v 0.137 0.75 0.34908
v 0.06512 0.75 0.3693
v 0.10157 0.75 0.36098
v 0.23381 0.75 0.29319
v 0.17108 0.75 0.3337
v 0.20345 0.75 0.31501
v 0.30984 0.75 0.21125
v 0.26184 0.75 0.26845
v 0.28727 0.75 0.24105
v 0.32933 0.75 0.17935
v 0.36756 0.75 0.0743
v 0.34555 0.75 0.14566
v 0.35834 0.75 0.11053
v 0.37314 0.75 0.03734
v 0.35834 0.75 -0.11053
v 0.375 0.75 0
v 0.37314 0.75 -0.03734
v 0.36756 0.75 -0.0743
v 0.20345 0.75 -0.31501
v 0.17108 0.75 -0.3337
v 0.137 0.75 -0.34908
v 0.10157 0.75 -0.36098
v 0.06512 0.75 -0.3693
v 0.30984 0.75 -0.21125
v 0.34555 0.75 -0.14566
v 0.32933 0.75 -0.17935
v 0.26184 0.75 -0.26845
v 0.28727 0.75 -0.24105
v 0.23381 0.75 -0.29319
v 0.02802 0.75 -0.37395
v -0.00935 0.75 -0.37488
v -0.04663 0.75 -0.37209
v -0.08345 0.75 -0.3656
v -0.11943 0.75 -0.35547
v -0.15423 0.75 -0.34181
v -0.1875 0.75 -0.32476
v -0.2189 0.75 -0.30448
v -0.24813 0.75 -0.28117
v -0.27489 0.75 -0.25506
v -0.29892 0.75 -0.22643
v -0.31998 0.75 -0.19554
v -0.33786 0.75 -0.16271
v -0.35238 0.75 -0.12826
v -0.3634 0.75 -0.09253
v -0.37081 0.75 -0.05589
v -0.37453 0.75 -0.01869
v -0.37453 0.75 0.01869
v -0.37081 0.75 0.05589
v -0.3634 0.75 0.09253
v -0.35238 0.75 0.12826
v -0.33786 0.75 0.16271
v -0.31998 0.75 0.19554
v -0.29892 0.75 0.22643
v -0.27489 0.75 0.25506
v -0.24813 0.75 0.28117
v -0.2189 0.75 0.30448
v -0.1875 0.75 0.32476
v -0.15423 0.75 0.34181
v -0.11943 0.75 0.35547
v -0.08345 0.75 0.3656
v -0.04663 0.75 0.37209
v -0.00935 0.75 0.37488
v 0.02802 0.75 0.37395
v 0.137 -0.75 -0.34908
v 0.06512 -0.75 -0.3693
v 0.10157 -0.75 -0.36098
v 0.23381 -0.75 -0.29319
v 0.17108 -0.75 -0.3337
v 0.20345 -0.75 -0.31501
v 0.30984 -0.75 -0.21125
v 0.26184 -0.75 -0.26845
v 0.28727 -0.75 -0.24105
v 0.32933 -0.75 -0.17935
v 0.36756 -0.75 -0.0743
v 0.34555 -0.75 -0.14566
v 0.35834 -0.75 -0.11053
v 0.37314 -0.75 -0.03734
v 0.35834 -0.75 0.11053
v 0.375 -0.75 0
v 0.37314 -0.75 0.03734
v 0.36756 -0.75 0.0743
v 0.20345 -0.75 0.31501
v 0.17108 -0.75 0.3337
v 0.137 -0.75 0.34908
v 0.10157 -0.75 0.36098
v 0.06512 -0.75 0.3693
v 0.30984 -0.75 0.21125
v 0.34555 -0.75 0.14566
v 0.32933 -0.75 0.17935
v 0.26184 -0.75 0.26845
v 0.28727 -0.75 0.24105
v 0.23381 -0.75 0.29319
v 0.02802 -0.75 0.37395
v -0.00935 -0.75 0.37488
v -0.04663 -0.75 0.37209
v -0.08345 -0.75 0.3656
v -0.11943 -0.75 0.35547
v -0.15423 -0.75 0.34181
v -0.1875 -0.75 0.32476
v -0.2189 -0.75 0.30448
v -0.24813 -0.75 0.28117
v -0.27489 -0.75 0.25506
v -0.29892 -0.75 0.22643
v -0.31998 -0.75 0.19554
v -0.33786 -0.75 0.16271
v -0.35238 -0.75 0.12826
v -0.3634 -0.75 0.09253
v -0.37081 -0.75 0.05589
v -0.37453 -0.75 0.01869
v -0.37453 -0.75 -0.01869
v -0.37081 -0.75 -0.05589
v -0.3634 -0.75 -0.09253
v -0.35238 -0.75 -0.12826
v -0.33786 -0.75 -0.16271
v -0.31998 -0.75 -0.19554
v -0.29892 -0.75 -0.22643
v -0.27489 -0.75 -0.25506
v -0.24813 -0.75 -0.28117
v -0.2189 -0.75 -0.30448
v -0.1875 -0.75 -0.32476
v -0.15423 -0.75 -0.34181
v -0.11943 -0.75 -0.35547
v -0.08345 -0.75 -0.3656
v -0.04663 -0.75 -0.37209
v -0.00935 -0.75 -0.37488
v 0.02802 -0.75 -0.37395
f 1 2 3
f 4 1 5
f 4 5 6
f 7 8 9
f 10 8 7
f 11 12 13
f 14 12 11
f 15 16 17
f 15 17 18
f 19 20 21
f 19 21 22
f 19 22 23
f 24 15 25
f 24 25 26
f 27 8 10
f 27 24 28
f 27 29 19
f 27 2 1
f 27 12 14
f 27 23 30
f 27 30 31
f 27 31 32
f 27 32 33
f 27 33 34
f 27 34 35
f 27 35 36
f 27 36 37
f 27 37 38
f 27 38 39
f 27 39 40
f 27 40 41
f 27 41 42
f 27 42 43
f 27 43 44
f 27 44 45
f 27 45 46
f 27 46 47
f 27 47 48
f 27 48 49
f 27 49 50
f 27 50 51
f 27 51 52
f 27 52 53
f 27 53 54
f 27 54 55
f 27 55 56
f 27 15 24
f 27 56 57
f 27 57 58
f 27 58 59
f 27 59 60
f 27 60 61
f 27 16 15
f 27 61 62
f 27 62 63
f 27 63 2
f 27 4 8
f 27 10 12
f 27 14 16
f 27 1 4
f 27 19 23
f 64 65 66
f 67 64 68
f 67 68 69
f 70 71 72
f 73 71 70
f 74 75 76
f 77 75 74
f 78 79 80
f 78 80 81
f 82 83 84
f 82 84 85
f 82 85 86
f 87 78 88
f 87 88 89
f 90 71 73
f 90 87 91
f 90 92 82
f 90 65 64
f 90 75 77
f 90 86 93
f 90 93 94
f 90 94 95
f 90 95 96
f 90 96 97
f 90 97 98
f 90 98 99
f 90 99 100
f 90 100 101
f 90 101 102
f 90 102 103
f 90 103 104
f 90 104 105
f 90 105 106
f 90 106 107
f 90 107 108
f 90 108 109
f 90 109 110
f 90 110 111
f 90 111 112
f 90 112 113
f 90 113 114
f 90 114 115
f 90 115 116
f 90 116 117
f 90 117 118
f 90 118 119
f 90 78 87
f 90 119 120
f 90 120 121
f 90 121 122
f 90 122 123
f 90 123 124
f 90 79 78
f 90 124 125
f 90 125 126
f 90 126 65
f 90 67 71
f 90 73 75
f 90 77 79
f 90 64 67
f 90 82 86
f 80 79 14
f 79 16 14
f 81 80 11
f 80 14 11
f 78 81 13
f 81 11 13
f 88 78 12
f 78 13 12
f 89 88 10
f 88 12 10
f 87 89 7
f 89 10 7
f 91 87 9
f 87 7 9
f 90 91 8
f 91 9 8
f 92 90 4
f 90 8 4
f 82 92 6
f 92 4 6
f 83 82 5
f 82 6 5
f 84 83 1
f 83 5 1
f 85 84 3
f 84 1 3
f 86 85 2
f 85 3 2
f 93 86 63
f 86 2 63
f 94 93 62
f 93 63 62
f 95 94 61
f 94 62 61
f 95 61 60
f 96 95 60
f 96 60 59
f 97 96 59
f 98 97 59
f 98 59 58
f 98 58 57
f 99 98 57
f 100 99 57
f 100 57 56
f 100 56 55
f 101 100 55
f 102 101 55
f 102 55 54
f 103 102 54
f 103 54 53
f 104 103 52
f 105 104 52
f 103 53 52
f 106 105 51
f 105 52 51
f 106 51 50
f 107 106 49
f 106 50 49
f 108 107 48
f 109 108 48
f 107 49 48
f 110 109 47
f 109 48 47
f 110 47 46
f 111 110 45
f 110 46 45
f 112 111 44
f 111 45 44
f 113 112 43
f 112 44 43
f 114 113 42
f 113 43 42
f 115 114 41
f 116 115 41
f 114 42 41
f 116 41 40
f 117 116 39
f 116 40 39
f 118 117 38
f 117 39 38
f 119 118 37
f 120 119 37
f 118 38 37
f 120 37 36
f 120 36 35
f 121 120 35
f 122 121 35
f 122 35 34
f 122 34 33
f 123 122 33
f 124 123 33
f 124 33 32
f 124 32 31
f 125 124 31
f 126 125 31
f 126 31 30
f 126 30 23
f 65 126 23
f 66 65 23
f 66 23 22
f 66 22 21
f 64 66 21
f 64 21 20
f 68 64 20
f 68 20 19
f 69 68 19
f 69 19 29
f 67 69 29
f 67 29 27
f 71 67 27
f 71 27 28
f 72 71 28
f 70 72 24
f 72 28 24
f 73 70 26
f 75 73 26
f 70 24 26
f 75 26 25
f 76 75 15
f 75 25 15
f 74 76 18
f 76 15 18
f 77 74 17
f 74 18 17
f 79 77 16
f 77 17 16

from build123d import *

# Parameters (mm, degrees)
SKETCH1_R           = 0.375
BOSS_EXTRUDE1_DEPTH = 0.125
SKETCH2_R           = 0.375
BOSS_EXTRUDE2_DEPTH = 0.625
SKETCH3_R           = 0.375
BOSS_EXTRUDE3_DEPTH = 0.625


with BuildPart() as part:
    # Sketch1 → Boss-Extrude1 (new body, symmetric)
    with BuildSketch(Plane(origin=(0, 0, 0), x_dir=(1, 0, 0), z_dir=(0, 1, 0))):
        Circle(SKETCH1_R)
    extrude(amount=BOSS_EXTRUDE1_DEPTH, both=True)

    # Sketch2 → Boss-Extrude2 (add)
    with BuildSketch(Plane(origin=(0, 0.125, 0), x_dir=(1, 0, 0), z_dir=(0, 1, 0))):
        Circle(SKETCH2_R)
    extrude(amount=BOSS_EXTRUDE2_DEPTH)

    # Sketch3 → Boss-Extrude3 (add)
    with BuildSketch(Plane.XZ.offset(0.125)):
        Circle(SKETCH3_R)
    extrude(amount=BOSS_EXTRUDE3_DEPTH)


solid = part.part
